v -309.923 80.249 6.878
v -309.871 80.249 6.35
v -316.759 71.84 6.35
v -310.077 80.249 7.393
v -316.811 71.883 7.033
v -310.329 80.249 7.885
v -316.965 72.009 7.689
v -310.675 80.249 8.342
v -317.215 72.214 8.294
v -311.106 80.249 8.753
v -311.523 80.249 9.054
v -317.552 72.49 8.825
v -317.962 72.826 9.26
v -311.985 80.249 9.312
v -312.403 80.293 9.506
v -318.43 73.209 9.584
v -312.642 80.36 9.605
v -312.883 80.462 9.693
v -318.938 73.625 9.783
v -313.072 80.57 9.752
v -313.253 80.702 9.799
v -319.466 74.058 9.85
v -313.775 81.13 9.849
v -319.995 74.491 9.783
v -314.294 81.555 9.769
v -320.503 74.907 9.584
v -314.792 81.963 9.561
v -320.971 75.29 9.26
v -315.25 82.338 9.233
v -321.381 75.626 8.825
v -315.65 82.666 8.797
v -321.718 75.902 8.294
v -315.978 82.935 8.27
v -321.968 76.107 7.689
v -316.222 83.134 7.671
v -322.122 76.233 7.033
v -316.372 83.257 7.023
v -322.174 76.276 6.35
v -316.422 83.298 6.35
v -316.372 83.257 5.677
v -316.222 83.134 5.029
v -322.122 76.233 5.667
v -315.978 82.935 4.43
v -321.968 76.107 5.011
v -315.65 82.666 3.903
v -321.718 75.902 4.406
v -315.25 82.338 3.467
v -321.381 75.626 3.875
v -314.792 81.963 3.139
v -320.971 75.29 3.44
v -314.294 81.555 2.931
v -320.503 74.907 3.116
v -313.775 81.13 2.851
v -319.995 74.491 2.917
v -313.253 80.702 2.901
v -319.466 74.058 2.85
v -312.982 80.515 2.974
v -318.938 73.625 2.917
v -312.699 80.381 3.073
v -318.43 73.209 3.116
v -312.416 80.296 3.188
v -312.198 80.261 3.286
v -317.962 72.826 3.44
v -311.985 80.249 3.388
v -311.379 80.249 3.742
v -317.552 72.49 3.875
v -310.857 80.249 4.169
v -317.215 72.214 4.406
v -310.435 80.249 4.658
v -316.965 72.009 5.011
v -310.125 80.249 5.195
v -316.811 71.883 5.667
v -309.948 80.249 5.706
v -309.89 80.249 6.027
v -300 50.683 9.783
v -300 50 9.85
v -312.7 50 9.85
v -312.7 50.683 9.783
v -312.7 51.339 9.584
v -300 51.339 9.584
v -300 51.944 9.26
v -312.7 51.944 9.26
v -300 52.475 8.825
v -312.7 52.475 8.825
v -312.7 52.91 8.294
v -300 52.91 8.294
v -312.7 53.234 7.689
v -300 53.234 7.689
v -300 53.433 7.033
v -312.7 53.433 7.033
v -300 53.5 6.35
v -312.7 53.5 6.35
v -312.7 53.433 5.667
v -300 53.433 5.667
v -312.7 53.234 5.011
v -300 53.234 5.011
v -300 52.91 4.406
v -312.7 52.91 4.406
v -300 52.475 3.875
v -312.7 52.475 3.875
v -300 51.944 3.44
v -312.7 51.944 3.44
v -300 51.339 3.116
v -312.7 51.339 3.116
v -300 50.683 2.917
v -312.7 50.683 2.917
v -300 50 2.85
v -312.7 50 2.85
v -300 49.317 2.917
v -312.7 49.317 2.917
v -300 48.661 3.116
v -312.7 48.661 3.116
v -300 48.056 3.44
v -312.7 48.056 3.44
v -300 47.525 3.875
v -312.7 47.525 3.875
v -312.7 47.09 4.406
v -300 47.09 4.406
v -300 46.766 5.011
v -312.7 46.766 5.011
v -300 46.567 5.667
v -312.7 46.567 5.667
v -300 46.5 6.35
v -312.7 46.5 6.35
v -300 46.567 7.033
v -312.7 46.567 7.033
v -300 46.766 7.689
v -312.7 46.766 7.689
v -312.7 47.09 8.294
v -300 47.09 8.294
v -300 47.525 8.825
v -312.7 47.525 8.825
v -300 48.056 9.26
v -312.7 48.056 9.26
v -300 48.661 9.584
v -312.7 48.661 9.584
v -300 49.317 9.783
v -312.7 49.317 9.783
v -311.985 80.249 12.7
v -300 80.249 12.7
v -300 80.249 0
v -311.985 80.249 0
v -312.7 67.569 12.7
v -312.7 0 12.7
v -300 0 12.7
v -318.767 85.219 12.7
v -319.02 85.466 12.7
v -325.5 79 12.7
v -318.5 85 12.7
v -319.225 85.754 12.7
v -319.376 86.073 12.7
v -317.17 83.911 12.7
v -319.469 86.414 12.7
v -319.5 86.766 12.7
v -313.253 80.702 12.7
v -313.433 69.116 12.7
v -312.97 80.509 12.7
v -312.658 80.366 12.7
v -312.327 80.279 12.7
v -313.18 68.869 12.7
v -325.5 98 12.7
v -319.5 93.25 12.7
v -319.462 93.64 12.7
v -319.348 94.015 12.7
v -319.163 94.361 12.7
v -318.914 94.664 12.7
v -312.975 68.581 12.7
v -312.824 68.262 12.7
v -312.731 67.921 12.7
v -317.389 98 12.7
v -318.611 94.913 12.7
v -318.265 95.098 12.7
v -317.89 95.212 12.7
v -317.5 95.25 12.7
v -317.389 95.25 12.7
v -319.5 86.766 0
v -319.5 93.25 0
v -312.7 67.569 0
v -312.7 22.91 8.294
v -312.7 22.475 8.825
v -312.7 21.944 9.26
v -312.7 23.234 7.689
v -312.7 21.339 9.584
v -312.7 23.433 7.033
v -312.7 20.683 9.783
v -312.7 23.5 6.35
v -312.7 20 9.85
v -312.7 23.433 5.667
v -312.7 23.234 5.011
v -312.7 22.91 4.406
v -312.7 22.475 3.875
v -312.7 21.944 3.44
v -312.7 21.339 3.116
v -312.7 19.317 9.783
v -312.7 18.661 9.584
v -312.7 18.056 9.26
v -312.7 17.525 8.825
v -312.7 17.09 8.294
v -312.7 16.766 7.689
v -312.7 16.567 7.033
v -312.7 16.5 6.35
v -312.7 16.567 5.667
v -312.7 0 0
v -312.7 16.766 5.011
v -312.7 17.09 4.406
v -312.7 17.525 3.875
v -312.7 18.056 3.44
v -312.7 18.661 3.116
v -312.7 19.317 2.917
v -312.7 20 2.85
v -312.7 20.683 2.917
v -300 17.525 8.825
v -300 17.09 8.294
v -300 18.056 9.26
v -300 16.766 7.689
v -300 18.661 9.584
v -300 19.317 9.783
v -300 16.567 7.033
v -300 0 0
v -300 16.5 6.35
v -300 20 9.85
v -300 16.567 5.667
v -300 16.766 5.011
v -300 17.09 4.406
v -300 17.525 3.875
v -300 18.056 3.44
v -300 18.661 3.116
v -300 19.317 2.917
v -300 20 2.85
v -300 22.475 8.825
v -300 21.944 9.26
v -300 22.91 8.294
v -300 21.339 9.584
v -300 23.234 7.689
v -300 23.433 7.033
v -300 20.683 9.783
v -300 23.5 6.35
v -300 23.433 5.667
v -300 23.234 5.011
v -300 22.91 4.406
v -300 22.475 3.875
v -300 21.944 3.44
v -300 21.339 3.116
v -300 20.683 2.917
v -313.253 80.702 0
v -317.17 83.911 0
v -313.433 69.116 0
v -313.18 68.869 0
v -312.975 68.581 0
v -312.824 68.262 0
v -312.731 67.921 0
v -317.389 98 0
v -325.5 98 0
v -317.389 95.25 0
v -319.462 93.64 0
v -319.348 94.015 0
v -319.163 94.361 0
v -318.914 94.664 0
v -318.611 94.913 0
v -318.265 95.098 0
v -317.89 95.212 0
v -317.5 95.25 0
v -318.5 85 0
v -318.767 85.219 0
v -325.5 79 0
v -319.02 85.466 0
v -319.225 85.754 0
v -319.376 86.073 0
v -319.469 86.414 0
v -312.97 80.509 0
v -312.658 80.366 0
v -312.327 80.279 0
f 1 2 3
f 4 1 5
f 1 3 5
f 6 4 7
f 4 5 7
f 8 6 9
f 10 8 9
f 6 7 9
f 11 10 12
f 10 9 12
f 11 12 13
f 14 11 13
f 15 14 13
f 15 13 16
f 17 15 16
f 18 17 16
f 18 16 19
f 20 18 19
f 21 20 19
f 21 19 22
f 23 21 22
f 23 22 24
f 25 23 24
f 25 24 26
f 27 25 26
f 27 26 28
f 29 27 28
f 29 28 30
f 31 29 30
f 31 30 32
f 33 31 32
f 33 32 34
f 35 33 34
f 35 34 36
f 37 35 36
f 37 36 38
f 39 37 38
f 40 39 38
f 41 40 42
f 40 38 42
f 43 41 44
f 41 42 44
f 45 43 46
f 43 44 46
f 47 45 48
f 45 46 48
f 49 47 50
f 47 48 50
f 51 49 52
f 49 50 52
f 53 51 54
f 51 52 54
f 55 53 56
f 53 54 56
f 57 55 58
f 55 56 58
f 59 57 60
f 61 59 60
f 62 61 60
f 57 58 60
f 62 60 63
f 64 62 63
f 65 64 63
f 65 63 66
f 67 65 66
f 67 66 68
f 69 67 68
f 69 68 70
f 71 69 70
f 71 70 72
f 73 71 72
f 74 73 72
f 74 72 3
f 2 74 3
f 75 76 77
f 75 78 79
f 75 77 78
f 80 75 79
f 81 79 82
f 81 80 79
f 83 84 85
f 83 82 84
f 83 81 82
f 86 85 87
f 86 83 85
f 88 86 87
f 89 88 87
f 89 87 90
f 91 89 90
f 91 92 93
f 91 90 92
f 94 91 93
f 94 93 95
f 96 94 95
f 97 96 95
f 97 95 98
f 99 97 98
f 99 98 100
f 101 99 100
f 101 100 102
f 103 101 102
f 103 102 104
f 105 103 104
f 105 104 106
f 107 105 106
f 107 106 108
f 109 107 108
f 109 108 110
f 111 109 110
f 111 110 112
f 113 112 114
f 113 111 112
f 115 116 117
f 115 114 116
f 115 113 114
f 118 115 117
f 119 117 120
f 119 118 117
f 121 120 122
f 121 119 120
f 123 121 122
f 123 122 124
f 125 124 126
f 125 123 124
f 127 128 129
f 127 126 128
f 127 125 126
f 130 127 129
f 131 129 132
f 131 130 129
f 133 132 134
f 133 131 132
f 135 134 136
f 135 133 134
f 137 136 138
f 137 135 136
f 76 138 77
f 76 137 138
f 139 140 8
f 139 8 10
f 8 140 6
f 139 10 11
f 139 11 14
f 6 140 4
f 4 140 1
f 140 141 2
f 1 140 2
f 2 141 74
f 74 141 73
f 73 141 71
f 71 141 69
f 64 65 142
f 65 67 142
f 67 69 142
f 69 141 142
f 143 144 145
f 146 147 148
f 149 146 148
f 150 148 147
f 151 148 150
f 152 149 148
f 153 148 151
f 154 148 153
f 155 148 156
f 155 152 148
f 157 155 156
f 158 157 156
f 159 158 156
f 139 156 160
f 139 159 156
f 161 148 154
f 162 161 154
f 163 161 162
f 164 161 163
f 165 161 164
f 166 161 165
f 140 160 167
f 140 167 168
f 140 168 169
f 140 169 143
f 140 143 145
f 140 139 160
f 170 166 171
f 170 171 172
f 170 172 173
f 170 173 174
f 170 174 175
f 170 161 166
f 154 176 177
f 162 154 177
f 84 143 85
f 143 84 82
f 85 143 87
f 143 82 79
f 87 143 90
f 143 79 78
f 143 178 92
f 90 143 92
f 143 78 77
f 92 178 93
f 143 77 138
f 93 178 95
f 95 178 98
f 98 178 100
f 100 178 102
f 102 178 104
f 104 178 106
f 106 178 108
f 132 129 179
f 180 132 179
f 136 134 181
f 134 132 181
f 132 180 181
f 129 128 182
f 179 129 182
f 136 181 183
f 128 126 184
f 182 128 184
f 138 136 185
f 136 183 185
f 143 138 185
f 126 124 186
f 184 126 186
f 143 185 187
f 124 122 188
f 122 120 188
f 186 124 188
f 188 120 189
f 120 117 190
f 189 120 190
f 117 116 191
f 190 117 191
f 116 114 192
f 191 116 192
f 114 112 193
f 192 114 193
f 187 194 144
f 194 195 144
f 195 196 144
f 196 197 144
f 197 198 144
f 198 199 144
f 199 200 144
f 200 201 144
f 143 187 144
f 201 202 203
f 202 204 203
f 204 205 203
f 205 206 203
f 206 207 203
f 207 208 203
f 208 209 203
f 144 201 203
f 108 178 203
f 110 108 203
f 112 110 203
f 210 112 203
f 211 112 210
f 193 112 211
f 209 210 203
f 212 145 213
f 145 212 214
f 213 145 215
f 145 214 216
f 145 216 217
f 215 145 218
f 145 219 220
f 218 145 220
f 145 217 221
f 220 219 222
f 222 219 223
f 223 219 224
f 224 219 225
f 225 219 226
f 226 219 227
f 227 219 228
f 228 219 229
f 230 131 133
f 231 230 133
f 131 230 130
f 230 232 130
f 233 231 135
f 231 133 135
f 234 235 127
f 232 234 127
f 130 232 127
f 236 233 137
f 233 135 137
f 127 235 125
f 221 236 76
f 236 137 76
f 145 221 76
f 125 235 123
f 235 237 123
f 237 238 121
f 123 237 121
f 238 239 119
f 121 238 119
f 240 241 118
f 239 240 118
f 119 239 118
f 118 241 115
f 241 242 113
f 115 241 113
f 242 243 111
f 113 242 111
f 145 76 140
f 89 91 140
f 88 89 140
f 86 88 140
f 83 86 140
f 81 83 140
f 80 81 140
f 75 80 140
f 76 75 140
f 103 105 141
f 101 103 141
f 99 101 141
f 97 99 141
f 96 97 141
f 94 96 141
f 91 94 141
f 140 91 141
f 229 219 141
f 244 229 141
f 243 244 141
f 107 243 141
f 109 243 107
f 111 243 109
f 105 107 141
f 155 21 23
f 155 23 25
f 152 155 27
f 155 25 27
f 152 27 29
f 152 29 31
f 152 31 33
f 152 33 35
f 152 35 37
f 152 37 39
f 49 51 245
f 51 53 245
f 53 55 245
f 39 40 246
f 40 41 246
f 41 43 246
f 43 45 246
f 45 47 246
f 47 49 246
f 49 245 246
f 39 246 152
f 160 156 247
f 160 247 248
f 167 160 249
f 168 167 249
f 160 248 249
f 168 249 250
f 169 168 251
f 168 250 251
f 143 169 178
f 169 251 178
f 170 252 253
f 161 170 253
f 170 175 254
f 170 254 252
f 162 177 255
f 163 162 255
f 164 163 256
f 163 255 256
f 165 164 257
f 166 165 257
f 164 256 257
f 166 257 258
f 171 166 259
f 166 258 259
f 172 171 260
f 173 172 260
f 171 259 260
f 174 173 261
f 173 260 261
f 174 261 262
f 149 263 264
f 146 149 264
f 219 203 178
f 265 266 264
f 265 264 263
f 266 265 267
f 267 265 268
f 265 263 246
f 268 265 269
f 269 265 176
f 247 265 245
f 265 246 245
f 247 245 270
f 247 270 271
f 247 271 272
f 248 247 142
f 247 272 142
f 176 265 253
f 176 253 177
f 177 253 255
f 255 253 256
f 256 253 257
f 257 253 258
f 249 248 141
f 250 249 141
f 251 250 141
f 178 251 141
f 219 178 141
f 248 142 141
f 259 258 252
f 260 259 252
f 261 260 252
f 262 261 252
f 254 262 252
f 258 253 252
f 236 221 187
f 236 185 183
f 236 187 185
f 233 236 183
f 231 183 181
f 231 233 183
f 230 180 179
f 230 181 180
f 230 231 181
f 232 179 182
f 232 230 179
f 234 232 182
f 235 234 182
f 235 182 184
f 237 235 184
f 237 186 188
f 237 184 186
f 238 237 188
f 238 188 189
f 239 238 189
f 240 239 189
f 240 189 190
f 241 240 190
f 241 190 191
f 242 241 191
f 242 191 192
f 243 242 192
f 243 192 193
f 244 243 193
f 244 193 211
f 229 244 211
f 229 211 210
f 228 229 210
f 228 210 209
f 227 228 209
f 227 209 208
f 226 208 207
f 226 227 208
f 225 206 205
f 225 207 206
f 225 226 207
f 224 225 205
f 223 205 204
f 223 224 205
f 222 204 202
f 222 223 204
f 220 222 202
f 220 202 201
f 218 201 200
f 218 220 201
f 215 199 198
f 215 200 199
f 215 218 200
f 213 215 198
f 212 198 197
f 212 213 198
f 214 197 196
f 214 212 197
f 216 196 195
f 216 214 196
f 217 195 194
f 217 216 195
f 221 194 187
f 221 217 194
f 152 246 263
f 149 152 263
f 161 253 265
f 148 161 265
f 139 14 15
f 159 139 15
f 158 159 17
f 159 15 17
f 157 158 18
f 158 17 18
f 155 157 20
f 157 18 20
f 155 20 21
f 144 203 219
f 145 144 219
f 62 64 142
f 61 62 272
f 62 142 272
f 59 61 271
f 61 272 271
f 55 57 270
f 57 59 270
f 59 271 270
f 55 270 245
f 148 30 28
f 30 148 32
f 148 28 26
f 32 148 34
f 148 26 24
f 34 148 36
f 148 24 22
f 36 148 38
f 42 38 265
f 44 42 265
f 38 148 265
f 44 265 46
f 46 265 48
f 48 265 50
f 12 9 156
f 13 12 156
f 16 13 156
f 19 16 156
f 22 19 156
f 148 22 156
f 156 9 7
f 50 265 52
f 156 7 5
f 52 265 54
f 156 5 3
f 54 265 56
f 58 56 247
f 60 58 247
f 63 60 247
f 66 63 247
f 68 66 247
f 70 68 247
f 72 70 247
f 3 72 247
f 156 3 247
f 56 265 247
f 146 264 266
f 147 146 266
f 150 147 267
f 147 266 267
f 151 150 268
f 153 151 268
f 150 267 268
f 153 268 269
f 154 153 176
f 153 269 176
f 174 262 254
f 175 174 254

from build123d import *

# Parameters (mm, degrees)
BOSS_EXTRUDE1_DEPTH     = 12.7
CUT_EXTRUDE1_DEPTH      = 100.645019946
CUT_EXTRUDE1_DEPTH_BACK = 100.645019946
SKETCH6_R               = 3.5
SKETCH8_R               = 3.5
CUT_EXTRUDE2_DEPTH      = 315.511656717


with BuildPart() as part:
    # Sketch1 → Boss-Extrude1 (new body)
    with BuildSketch(Plane.XY):
        with BuildLine():
            Line((-312.7, 0), (-300, 0))
            Line((-300, 0), (-300, 80.249402298))
            Line((-300, 80.249402298), (-311.985474591, 80.249402298))
            ThreePointArc((-311.985474591, 80.249402298), (-312.658347569, 80.365989981), (-313.252771846, 80.702160342))
            Line((-313.252771846, 80.702160342), (-317.170141731, 83.91075489))
            Line((-317.170141731, 83.91075489), (-318.5, 85))
            Line((-318.5, 85), (-318.767297255, 85.21893478))
            ThreePointArc((-318.767297255, 85.21893478), (-319.307566667, 85.91019616), (-319.5, 86.766176735))
            Line((-319.5, 86.766176735), (-319.5, 93.25))
            ThreePointArc((-319.5, 93.25), (-318.914213562, 94.664213562), (-317.5, 95.25))
            Line((-317.5, 95.25), (-317.388555411, 95.25))
            Line((-317.388555411, 95.25), (-317.388555411, 96.25))
            Line((-317.388555411, 96.25), (-317.388555411, 98))
            Line((-317.388555411, 98), (-318.5, 98))
            Line((-318.5, 98), (-325.5, 98))
            Line((-325.5, 98), (-325.5, 85))
            Line((-325.5, 85), (-325.5, 82))
            Line((-325.5, 82), (-325.5, 79))
            Line((-325.5, 79), (-313.432702745, 69.116056102))
            ThreePointArc((-313.432702745, 69.116056102), (-312.892433333, 68.424794722), (-312.7, 67.568814146))
            Line((-312.7, 67.568814146), (-312.7, 63.3))
            Line((-312.7, 63.3), (-312.7, 60.3))
            Line((-312.7, 60.3), (-312.7, 0))
        make_face()
    extrude(amount=BOSS_EXTRUDE1_DEPTH)

    # Sketch6 → Cut-Extrude1 (cut, two sides: drawn at the far end of the back side and taken through both)
    with BuildSketch(Plane.ZY.offset(312.7).offset(-CUT_EXTRUDE1_DEPTH_BACK)):
        with Locations((6.35, 50)):
            Circle(SKETCH6_R)
        with Locations((6.35, 20)):
            Circle(SKETCH6_R)
    extrude(amount=CUT_EXTRUDE1_DEPTH + CUT_EXTRUDE1_DEPTH_BACK, mode=Mode.SUBTRACT)

    # Sketch8 → Cut-Extrude2 (cut, through all)
    with BuildSketch(Plane(origin=(-91.96558898, -112.280695929, 0), x_dir=(0.7736209776319443, -0.6336486273699289, 0), z_dir=(-0.6336486273699289, -0.7736209776319443, 0))):
        with Locations((-294.07263889, 6.35)):
            Circle(SKETCH8_R)
    extrude(amount=-CUT_EXTRUDE2_DEPTH, mode=Mode.SUBTRACT)


solid = part.part
